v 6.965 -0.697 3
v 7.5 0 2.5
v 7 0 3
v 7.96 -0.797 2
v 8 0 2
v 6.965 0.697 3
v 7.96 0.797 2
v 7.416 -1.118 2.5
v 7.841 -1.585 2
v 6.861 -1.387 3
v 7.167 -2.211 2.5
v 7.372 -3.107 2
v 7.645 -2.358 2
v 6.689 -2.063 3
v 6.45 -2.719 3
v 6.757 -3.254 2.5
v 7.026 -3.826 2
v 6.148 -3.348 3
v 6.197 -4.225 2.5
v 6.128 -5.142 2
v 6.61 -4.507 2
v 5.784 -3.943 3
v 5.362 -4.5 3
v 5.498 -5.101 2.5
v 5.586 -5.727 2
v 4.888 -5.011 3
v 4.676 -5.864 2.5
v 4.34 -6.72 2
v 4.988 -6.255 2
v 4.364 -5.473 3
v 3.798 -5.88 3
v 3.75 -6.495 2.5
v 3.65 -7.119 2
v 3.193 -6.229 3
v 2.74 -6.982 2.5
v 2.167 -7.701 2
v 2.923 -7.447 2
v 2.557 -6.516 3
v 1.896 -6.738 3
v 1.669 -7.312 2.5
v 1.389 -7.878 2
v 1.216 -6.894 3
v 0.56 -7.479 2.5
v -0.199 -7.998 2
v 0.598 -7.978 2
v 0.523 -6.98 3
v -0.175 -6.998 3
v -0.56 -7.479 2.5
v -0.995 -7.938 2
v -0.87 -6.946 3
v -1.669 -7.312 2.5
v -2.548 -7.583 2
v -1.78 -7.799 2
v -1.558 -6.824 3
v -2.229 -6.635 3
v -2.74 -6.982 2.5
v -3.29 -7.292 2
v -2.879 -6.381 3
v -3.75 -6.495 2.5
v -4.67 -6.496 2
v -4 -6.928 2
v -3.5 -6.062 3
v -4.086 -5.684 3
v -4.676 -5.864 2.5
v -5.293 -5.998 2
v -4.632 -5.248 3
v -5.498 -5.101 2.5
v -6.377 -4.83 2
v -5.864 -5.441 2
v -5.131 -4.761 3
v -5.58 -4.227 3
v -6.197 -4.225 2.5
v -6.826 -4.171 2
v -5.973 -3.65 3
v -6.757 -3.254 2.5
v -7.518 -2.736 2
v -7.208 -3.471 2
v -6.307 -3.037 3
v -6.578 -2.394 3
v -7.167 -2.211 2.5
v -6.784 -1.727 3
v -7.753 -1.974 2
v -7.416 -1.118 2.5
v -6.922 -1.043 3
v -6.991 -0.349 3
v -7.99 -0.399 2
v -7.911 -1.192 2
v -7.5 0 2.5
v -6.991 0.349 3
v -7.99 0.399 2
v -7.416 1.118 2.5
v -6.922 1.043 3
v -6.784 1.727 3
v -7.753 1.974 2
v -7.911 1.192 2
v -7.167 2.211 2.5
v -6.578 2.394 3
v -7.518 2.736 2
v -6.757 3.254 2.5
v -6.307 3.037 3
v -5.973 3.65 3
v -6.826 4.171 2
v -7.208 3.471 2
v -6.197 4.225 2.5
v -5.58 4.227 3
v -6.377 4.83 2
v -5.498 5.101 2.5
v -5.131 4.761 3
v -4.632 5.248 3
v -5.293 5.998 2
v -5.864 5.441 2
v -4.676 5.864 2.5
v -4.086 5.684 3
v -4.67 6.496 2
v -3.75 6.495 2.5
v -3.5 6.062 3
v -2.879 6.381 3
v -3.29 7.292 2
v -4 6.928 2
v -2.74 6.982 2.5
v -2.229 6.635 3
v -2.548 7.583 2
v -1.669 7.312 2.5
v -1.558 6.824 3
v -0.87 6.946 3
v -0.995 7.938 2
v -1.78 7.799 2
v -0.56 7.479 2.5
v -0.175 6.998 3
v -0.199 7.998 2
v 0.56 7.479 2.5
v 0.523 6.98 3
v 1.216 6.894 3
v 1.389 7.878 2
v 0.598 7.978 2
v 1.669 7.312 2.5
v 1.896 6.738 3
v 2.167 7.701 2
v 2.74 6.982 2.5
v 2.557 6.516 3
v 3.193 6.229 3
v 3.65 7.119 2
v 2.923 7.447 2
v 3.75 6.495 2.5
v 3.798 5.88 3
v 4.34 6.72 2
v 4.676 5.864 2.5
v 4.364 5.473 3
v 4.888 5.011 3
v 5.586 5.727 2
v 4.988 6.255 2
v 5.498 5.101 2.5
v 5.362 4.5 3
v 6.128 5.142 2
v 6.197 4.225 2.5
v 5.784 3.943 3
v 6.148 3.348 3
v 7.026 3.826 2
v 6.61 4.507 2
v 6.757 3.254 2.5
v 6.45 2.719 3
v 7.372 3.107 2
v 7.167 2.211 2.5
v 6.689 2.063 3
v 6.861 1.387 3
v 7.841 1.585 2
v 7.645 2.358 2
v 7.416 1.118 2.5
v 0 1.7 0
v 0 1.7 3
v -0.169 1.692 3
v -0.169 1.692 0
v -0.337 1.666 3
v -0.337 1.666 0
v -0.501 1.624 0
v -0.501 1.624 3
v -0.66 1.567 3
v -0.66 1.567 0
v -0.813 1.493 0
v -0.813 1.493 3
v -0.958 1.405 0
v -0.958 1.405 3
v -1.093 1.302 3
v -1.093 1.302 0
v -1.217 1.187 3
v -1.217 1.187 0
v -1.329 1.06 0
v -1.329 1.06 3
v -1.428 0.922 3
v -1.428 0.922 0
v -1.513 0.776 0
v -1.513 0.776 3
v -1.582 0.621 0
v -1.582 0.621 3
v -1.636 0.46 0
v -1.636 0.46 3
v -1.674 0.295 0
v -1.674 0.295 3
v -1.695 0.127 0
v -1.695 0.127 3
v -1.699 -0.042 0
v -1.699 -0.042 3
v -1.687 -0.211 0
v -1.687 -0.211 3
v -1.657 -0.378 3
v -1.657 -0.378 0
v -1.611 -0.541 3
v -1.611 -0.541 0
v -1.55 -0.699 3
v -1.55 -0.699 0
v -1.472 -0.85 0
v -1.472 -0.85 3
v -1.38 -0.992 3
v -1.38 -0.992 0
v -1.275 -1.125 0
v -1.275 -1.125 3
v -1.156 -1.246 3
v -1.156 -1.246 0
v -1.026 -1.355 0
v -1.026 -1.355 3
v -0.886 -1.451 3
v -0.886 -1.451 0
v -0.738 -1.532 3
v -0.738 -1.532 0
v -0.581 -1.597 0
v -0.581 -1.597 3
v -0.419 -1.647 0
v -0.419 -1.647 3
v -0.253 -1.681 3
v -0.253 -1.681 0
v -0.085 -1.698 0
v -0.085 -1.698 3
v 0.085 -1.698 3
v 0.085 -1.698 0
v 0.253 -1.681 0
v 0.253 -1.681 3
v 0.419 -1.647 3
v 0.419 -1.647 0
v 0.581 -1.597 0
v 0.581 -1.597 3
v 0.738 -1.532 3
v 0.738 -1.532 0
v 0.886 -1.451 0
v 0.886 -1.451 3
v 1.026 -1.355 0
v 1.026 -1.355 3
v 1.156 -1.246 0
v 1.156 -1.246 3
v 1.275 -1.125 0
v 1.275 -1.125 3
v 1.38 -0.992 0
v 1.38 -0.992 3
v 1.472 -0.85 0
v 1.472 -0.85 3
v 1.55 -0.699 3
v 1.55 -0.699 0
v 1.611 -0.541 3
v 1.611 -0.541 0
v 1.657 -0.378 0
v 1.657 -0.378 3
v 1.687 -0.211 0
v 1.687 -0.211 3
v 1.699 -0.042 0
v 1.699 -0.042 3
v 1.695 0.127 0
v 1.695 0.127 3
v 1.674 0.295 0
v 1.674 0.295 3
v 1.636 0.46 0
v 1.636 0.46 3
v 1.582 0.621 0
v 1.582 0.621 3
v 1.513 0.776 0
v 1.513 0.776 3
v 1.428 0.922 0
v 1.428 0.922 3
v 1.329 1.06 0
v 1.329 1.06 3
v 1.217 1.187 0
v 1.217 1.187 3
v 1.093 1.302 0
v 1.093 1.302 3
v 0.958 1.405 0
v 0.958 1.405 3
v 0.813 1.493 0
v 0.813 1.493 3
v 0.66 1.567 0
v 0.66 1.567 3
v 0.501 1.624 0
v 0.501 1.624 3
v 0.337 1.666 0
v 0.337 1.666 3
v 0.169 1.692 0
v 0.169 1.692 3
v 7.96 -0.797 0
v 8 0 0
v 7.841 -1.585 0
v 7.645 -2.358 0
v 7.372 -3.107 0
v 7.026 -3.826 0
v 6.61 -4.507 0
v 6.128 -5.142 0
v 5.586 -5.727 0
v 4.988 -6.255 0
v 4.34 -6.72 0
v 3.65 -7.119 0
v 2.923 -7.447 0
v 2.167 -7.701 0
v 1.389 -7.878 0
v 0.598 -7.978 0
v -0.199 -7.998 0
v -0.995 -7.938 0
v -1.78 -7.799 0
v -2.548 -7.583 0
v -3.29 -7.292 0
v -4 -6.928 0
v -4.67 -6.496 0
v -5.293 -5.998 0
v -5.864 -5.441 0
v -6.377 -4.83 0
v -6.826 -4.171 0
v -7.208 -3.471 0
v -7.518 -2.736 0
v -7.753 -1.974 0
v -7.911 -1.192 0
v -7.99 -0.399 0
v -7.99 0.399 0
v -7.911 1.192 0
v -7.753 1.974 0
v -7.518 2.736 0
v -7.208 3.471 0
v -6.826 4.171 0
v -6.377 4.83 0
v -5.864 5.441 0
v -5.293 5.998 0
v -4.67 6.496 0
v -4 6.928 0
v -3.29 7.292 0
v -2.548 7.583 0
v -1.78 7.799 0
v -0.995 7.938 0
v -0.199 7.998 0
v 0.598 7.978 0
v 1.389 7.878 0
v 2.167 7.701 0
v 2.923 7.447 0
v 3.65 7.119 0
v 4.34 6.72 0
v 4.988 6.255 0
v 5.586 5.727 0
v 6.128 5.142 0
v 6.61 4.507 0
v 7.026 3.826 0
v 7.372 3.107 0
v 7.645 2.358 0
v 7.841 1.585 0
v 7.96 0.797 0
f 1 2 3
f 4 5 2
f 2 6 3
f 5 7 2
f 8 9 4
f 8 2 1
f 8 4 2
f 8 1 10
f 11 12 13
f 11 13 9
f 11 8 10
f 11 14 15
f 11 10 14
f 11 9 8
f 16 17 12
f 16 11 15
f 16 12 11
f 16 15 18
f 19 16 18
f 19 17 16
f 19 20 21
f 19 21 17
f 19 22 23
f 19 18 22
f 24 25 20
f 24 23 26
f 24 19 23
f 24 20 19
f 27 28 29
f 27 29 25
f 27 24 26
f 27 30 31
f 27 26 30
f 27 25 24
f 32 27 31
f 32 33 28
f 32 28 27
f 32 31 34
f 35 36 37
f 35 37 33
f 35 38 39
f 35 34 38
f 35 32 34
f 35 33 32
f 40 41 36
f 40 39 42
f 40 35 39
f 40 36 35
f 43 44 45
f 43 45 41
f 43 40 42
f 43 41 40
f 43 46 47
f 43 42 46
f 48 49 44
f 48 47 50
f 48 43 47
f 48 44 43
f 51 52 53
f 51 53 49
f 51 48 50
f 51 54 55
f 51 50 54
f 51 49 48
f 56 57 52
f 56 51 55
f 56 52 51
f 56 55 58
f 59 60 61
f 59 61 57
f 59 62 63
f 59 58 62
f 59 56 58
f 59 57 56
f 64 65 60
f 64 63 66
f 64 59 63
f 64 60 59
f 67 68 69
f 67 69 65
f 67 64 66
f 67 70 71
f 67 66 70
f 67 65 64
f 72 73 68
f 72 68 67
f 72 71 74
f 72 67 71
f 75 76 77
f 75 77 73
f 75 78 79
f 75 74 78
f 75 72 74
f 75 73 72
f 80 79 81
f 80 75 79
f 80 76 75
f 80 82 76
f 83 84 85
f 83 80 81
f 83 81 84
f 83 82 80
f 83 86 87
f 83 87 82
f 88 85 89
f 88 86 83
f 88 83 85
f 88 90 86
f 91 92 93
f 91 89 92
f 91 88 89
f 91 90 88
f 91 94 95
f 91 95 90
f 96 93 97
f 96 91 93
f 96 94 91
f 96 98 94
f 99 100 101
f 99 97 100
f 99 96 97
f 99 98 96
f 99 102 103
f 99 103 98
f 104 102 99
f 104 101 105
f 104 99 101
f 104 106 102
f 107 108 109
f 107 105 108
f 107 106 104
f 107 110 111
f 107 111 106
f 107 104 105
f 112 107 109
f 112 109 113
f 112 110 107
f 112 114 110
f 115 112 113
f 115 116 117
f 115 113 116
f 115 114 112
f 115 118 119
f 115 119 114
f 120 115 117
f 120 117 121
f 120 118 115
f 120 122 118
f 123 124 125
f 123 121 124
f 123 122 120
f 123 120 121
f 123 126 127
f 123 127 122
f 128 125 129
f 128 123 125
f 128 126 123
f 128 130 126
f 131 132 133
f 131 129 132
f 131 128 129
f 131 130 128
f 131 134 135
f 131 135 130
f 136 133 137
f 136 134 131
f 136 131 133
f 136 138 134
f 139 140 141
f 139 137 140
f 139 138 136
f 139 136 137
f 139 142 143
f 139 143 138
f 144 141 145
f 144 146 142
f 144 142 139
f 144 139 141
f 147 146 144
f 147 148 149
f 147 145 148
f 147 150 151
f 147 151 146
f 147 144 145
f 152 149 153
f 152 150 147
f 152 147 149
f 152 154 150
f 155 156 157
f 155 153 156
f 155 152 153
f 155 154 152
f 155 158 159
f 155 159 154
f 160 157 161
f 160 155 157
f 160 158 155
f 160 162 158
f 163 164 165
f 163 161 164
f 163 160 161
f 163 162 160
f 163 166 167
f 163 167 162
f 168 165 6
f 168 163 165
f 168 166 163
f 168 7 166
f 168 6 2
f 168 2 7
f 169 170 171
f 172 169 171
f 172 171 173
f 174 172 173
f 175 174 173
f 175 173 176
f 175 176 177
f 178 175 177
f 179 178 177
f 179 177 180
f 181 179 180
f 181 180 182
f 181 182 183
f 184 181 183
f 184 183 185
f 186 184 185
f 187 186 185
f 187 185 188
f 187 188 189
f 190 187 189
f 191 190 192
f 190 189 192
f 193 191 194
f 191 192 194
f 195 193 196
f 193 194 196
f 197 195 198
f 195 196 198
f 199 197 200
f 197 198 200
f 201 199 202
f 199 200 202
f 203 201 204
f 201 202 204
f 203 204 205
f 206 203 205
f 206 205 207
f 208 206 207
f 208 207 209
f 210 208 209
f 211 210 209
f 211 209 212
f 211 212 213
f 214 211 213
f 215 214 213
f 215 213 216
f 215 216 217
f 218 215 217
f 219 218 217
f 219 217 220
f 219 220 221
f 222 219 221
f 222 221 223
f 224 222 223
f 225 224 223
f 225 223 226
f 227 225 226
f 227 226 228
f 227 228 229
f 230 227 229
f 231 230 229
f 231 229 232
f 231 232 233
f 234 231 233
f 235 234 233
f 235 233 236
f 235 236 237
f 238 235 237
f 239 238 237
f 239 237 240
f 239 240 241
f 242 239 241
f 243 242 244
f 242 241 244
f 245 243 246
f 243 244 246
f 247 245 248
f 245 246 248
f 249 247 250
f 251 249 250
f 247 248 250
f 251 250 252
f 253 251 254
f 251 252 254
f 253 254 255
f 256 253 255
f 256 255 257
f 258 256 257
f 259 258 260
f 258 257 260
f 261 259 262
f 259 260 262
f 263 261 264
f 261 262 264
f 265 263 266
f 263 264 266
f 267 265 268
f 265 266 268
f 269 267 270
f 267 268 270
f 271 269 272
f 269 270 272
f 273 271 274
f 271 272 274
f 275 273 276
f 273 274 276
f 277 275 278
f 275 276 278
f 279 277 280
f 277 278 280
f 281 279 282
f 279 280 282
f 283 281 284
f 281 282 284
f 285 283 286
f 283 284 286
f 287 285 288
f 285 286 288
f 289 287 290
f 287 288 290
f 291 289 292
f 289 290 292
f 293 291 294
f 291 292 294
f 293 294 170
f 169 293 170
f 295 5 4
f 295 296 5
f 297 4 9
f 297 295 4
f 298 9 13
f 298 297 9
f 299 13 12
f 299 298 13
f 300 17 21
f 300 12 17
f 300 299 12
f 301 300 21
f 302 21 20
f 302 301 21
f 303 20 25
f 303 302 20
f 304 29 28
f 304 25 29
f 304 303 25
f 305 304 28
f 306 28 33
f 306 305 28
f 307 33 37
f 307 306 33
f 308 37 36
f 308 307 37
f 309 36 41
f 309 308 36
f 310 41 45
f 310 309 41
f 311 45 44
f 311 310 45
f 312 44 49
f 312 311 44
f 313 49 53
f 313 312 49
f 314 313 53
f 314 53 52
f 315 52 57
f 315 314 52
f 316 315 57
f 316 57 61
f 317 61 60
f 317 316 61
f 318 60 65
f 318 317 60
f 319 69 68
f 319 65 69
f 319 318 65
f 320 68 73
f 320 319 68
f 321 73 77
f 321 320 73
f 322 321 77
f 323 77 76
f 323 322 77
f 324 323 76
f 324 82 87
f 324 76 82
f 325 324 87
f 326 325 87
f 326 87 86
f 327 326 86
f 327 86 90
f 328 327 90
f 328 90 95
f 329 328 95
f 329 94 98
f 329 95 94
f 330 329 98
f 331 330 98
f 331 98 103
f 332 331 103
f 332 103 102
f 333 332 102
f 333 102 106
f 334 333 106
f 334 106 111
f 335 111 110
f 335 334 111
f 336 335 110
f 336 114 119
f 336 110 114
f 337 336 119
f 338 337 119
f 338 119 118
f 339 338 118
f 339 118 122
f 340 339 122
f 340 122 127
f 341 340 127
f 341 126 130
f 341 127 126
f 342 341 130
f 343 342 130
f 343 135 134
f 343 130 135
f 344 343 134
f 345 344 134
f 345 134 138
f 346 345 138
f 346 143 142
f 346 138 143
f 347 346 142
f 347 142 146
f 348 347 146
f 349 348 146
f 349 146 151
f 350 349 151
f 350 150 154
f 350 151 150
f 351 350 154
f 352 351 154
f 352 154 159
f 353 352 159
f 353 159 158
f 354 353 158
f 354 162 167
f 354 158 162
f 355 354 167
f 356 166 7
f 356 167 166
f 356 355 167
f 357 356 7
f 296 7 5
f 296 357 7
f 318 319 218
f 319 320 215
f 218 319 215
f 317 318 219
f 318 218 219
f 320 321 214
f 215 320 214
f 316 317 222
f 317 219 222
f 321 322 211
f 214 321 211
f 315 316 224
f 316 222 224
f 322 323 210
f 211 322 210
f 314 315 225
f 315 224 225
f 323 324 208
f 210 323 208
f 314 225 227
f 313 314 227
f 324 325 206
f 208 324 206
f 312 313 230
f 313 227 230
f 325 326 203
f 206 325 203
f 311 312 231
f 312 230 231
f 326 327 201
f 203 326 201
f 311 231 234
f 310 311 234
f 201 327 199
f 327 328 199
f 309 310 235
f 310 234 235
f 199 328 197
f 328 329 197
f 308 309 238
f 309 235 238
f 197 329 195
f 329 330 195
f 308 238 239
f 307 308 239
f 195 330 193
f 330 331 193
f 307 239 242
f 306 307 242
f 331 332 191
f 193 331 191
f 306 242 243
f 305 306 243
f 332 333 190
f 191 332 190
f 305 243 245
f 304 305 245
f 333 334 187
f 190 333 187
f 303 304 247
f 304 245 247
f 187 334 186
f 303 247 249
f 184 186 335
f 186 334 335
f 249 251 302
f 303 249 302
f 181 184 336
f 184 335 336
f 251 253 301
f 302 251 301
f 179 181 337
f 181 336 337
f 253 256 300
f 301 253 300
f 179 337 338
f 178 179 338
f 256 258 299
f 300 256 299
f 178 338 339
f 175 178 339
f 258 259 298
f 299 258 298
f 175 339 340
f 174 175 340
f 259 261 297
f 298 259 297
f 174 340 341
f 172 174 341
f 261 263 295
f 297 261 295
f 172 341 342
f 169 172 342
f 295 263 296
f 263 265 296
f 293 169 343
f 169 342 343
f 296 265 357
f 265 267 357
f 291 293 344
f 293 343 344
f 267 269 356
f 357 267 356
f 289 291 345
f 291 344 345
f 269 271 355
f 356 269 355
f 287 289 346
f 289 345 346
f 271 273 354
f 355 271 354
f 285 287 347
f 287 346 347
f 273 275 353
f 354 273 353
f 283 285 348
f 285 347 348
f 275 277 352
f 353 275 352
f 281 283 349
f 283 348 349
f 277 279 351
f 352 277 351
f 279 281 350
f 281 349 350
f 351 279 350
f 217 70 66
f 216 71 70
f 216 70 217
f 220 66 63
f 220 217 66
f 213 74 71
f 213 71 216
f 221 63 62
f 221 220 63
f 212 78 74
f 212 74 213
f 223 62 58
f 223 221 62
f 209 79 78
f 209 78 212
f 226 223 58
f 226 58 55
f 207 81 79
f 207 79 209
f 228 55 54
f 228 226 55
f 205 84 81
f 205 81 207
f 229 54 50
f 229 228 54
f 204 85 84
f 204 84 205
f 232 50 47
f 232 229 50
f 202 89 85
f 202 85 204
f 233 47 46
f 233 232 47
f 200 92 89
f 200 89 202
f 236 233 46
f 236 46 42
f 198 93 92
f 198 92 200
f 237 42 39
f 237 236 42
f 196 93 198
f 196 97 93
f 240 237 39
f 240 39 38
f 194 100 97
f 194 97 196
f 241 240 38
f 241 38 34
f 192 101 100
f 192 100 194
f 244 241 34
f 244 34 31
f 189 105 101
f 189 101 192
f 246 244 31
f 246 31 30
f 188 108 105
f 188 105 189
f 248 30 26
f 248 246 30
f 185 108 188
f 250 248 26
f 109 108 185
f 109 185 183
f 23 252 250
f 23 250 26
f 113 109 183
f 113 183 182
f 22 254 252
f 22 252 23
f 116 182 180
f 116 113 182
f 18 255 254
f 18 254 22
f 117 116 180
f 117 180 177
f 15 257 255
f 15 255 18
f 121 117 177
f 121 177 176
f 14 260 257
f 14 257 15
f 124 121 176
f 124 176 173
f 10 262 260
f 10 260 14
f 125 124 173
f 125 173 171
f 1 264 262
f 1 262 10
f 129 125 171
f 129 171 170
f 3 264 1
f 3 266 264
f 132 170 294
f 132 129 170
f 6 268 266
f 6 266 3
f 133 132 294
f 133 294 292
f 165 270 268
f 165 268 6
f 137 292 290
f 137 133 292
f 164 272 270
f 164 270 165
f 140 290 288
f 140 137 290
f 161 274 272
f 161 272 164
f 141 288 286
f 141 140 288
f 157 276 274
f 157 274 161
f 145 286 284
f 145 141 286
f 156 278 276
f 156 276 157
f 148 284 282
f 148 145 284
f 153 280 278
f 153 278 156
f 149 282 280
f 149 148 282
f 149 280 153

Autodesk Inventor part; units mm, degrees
ref_plane "YZ Plane" through (0, 0, 0) normal (1, 0, 0) x (0, 1, 0)
ref_plane "XZ Plane" through (0, 0, 0) normal (0, 1, 0) x (-1, 0, 0)
ref_plane "XY Plane" through (0, 0, 0) normal (0, 0, 1) x (1, 0, 0)
sketch "Skizze1" plane through (0, 0, 0) normal (0, 0, 1) x (1, 0, 0)
  circle A0 centre (0, 0) radius 8
  dimension "d0" = 16
extrude "Extrusion1" add sketch "Skizze1" along normal blind 3
chamfer "Fase1" distance 1 angle 45 1 edges at (-8, 0, 3)
hole "Bohrung1" at (0, 0, 0) direction (0, 0, 1) diameter 3.4 depth 8 tip angle 118 clearance for "Sechskantkopfschraube DIN EN 24017" size "M3" standard "DIN"
properties part number "Capstondisc_v2_Anschlagscheibe" material "Aluminium 6061"
